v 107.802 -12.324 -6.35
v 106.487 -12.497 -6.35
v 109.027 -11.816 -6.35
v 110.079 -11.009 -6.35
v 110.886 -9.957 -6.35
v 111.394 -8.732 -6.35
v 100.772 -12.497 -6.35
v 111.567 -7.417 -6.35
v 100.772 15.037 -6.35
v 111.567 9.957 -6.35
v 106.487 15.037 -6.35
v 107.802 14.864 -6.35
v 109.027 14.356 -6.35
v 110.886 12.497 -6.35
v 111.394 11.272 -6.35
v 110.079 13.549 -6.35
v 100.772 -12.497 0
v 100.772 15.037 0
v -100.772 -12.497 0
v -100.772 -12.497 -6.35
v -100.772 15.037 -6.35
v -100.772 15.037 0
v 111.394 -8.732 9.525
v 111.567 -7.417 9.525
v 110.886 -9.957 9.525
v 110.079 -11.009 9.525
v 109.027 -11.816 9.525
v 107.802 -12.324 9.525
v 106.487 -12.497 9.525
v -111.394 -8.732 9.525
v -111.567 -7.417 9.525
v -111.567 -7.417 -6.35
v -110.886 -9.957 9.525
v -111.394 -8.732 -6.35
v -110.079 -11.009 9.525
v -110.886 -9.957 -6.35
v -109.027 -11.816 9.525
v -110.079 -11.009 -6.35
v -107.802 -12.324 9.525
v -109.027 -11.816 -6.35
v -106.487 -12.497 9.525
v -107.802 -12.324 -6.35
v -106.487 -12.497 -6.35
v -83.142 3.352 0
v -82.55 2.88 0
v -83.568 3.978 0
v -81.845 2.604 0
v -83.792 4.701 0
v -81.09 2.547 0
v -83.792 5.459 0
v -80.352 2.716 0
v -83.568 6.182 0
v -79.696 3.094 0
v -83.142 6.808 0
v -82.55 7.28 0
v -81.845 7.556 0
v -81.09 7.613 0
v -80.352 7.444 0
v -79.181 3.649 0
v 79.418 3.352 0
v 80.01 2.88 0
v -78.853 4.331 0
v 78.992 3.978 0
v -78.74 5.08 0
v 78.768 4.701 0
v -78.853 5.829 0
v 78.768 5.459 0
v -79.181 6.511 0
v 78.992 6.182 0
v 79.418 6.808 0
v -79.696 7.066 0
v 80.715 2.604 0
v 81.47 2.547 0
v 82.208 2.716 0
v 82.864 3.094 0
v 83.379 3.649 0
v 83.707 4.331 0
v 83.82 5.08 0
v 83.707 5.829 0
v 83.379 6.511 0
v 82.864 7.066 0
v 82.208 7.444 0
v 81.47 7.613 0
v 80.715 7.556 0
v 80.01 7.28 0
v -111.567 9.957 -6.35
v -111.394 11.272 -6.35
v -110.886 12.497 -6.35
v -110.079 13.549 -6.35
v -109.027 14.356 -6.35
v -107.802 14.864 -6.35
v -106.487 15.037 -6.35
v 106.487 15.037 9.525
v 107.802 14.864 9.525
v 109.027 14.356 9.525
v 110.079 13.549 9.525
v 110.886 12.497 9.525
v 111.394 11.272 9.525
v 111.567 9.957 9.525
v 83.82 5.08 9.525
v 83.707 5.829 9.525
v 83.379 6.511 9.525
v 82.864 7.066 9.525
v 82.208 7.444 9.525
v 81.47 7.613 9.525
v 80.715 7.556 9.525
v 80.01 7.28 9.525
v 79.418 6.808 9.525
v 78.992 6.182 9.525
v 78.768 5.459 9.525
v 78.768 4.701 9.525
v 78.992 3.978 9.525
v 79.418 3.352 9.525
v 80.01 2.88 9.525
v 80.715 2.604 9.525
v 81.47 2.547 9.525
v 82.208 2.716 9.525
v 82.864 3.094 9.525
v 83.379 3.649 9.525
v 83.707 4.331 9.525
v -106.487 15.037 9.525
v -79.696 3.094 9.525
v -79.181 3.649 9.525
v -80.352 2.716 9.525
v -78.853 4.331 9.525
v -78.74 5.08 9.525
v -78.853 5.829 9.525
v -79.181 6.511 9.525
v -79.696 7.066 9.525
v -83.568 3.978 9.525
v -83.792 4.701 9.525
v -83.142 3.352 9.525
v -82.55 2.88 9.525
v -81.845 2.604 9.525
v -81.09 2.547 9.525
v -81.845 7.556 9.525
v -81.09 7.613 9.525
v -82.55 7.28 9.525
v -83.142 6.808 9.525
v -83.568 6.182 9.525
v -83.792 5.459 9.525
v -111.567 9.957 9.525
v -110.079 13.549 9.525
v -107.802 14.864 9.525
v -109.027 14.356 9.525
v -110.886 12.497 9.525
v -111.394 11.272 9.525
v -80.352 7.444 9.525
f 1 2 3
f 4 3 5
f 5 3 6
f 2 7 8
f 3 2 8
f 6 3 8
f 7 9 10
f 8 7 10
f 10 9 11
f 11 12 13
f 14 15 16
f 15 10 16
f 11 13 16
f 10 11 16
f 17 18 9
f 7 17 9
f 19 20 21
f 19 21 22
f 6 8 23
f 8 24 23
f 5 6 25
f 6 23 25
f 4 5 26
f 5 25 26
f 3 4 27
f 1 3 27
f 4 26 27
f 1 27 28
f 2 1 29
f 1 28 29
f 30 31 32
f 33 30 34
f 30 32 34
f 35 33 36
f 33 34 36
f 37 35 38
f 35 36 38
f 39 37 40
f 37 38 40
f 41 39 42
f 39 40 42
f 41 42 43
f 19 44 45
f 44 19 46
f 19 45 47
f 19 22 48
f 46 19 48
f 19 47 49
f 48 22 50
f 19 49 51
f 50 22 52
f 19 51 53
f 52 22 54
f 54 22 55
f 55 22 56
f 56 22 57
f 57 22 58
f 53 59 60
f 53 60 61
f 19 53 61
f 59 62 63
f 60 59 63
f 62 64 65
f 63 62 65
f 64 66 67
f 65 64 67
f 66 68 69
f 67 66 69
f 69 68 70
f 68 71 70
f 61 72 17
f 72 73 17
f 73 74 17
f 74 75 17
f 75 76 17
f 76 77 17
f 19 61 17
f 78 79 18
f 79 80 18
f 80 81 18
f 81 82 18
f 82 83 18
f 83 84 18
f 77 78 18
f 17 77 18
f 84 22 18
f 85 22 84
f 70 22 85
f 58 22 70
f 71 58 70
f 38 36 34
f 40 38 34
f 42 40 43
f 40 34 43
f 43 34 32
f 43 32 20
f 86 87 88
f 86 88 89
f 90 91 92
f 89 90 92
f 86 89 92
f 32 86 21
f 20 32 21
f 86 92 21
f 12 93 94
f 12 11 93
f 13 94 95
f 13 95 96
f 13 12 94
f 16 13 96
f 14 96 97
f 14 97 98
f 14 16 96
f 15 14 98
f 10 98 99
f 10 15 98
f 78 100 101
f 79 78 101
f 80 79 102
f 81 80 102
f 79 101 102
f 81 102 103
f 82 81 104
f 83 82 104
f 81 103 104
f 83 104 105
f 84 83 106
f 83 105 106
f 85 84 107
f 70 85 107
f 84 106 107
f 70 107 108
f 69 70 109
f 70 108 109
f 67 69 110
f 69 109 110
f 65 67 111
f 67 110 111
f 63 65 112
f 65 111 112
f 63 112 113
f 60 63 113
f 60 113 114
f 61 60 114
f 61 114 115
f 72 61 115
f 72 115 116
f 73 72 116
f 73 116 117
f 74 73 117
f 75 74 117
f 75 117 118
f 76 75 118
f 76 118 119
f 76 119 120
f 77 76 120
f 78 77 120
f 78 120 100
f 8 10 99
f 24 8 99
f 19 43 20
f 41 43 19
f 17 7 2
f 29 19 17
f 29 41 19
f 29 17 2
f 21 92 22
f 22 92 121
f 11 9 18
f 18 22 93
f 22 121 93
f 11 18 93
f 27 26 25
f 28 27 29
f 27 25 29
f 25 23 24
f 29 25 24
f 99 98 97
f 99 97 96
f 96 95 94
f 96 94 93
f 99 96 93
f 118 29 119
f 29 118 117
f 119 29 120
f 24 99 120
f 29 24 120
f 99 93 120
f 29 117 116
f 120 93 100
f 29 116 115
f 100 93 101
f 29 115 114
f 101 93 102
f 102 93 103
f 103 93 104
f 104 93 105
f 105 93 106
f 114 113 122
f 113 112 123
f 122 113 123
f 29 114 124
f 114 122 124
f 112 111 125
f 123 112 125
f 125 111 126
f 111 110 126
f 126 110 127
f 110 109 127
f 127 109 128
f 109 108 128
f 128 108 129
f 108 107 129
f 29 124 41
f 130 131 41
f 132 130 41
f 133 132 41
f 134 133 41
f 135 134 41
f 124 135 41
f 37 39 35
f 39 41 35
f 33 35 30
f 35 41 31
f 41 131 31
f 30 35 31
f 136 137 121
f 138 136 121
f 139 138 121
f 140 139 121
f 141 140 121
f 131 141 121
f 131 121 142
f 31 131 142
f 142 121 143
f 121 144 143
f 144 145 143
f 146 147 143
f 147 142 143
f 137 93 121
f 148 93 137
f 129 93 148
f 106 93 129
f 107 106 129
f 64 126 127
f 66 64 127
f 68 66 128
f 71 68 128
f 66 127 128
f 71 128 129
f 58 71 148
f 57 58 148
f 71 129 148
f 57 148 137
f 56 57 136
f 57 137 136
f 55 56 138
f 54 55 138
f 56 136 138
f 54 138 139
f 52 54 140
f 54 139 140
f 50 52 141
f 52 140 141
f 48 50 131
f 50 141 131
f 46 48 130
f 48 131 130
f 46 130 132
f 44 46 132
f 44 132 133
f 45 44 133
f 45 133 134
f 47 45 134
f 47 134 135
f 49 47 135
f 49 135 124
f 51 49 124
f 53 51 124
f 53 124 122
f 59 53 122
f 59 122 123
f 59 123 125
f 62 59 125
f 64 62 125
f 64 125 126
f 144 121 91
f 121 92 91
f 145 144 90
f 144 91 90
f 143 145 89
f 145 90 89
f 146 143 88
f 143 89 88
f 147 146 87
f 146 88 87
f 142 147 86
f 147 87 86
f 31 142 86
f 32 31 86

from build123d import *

# Parameters (mm, degrees)
F0_W     = 223.13392
F0_H     = 14.8336
F1_DEPTH = 9.525
F2_R     = 2.54
F3_DEPTH = 9.526
F4_W     = 10.795
F4_H     = 14.8336
F5_DEPTH = 6.35
F7_DEPTH = 12.7
F8_R     = 5.08


with BuildPart() as f1:
    # F0 (on Top) → F1 (new body)
    with BuildSketch(Plane.XY):
        with Locations((0, 7.62)):
            Rectangle(F0_W, F0_H)
    extrude(amount=F1_DEPTH)

    # F2 (on face) → F3 (cut, through all)
    with BuildSketch(Plane.XY.offset(9.525)):
        with Locations((-81.28, 5.08)):
            Circle(F2_R)
        with Locations((81.28, 5.08)):
            Circle(F2_R)
    extrude(amount=-F3_DEPTH, mode=Mode.SUBTRACT)

    # F4 (on face) → F5 (join)
    with BuildSketch(Plane(origin=(0, 0, 0), x_dir=(1, 0, 0), z_dir=(0, 0, -1))):
        with Locations((-106.16946, -7.62)):
            Rectangle(F4_W, F4_H)
        with Locations((106.16946, -7.62)):
            Rectangle(F4_W, F4_H)
    extrude(amount=F5_DEPTH)

    # F6 (on face) → F7 (join)
    with BuildSketch(Plane.XZ.offset(-0.2032)):
        Polygon((100.77196, -6.35), (111.56696, -6.35), (111.56696, 9.525), (-111.56696, 9.525), (-111.56696, -6.35), (-100.77196, -6.35), (-100.77196, 0), (100.77196, 0), align=None)
    extrude(amount=F7_DEPTH)

    # F8
    f8_edges = [f1.edges().sort_by_distance(p)[0] for p in [
        (111.56696, -12.4968, 1.5875),
        (111.56696, 15.0368, 1.5875),
        (-111.56696, -12.4968, 1.5875),
        (-111.56696, 15.0368, 1.5875),
    ]]
    fillet(f8_edges, radius=F8_R)


solid = f1.part
